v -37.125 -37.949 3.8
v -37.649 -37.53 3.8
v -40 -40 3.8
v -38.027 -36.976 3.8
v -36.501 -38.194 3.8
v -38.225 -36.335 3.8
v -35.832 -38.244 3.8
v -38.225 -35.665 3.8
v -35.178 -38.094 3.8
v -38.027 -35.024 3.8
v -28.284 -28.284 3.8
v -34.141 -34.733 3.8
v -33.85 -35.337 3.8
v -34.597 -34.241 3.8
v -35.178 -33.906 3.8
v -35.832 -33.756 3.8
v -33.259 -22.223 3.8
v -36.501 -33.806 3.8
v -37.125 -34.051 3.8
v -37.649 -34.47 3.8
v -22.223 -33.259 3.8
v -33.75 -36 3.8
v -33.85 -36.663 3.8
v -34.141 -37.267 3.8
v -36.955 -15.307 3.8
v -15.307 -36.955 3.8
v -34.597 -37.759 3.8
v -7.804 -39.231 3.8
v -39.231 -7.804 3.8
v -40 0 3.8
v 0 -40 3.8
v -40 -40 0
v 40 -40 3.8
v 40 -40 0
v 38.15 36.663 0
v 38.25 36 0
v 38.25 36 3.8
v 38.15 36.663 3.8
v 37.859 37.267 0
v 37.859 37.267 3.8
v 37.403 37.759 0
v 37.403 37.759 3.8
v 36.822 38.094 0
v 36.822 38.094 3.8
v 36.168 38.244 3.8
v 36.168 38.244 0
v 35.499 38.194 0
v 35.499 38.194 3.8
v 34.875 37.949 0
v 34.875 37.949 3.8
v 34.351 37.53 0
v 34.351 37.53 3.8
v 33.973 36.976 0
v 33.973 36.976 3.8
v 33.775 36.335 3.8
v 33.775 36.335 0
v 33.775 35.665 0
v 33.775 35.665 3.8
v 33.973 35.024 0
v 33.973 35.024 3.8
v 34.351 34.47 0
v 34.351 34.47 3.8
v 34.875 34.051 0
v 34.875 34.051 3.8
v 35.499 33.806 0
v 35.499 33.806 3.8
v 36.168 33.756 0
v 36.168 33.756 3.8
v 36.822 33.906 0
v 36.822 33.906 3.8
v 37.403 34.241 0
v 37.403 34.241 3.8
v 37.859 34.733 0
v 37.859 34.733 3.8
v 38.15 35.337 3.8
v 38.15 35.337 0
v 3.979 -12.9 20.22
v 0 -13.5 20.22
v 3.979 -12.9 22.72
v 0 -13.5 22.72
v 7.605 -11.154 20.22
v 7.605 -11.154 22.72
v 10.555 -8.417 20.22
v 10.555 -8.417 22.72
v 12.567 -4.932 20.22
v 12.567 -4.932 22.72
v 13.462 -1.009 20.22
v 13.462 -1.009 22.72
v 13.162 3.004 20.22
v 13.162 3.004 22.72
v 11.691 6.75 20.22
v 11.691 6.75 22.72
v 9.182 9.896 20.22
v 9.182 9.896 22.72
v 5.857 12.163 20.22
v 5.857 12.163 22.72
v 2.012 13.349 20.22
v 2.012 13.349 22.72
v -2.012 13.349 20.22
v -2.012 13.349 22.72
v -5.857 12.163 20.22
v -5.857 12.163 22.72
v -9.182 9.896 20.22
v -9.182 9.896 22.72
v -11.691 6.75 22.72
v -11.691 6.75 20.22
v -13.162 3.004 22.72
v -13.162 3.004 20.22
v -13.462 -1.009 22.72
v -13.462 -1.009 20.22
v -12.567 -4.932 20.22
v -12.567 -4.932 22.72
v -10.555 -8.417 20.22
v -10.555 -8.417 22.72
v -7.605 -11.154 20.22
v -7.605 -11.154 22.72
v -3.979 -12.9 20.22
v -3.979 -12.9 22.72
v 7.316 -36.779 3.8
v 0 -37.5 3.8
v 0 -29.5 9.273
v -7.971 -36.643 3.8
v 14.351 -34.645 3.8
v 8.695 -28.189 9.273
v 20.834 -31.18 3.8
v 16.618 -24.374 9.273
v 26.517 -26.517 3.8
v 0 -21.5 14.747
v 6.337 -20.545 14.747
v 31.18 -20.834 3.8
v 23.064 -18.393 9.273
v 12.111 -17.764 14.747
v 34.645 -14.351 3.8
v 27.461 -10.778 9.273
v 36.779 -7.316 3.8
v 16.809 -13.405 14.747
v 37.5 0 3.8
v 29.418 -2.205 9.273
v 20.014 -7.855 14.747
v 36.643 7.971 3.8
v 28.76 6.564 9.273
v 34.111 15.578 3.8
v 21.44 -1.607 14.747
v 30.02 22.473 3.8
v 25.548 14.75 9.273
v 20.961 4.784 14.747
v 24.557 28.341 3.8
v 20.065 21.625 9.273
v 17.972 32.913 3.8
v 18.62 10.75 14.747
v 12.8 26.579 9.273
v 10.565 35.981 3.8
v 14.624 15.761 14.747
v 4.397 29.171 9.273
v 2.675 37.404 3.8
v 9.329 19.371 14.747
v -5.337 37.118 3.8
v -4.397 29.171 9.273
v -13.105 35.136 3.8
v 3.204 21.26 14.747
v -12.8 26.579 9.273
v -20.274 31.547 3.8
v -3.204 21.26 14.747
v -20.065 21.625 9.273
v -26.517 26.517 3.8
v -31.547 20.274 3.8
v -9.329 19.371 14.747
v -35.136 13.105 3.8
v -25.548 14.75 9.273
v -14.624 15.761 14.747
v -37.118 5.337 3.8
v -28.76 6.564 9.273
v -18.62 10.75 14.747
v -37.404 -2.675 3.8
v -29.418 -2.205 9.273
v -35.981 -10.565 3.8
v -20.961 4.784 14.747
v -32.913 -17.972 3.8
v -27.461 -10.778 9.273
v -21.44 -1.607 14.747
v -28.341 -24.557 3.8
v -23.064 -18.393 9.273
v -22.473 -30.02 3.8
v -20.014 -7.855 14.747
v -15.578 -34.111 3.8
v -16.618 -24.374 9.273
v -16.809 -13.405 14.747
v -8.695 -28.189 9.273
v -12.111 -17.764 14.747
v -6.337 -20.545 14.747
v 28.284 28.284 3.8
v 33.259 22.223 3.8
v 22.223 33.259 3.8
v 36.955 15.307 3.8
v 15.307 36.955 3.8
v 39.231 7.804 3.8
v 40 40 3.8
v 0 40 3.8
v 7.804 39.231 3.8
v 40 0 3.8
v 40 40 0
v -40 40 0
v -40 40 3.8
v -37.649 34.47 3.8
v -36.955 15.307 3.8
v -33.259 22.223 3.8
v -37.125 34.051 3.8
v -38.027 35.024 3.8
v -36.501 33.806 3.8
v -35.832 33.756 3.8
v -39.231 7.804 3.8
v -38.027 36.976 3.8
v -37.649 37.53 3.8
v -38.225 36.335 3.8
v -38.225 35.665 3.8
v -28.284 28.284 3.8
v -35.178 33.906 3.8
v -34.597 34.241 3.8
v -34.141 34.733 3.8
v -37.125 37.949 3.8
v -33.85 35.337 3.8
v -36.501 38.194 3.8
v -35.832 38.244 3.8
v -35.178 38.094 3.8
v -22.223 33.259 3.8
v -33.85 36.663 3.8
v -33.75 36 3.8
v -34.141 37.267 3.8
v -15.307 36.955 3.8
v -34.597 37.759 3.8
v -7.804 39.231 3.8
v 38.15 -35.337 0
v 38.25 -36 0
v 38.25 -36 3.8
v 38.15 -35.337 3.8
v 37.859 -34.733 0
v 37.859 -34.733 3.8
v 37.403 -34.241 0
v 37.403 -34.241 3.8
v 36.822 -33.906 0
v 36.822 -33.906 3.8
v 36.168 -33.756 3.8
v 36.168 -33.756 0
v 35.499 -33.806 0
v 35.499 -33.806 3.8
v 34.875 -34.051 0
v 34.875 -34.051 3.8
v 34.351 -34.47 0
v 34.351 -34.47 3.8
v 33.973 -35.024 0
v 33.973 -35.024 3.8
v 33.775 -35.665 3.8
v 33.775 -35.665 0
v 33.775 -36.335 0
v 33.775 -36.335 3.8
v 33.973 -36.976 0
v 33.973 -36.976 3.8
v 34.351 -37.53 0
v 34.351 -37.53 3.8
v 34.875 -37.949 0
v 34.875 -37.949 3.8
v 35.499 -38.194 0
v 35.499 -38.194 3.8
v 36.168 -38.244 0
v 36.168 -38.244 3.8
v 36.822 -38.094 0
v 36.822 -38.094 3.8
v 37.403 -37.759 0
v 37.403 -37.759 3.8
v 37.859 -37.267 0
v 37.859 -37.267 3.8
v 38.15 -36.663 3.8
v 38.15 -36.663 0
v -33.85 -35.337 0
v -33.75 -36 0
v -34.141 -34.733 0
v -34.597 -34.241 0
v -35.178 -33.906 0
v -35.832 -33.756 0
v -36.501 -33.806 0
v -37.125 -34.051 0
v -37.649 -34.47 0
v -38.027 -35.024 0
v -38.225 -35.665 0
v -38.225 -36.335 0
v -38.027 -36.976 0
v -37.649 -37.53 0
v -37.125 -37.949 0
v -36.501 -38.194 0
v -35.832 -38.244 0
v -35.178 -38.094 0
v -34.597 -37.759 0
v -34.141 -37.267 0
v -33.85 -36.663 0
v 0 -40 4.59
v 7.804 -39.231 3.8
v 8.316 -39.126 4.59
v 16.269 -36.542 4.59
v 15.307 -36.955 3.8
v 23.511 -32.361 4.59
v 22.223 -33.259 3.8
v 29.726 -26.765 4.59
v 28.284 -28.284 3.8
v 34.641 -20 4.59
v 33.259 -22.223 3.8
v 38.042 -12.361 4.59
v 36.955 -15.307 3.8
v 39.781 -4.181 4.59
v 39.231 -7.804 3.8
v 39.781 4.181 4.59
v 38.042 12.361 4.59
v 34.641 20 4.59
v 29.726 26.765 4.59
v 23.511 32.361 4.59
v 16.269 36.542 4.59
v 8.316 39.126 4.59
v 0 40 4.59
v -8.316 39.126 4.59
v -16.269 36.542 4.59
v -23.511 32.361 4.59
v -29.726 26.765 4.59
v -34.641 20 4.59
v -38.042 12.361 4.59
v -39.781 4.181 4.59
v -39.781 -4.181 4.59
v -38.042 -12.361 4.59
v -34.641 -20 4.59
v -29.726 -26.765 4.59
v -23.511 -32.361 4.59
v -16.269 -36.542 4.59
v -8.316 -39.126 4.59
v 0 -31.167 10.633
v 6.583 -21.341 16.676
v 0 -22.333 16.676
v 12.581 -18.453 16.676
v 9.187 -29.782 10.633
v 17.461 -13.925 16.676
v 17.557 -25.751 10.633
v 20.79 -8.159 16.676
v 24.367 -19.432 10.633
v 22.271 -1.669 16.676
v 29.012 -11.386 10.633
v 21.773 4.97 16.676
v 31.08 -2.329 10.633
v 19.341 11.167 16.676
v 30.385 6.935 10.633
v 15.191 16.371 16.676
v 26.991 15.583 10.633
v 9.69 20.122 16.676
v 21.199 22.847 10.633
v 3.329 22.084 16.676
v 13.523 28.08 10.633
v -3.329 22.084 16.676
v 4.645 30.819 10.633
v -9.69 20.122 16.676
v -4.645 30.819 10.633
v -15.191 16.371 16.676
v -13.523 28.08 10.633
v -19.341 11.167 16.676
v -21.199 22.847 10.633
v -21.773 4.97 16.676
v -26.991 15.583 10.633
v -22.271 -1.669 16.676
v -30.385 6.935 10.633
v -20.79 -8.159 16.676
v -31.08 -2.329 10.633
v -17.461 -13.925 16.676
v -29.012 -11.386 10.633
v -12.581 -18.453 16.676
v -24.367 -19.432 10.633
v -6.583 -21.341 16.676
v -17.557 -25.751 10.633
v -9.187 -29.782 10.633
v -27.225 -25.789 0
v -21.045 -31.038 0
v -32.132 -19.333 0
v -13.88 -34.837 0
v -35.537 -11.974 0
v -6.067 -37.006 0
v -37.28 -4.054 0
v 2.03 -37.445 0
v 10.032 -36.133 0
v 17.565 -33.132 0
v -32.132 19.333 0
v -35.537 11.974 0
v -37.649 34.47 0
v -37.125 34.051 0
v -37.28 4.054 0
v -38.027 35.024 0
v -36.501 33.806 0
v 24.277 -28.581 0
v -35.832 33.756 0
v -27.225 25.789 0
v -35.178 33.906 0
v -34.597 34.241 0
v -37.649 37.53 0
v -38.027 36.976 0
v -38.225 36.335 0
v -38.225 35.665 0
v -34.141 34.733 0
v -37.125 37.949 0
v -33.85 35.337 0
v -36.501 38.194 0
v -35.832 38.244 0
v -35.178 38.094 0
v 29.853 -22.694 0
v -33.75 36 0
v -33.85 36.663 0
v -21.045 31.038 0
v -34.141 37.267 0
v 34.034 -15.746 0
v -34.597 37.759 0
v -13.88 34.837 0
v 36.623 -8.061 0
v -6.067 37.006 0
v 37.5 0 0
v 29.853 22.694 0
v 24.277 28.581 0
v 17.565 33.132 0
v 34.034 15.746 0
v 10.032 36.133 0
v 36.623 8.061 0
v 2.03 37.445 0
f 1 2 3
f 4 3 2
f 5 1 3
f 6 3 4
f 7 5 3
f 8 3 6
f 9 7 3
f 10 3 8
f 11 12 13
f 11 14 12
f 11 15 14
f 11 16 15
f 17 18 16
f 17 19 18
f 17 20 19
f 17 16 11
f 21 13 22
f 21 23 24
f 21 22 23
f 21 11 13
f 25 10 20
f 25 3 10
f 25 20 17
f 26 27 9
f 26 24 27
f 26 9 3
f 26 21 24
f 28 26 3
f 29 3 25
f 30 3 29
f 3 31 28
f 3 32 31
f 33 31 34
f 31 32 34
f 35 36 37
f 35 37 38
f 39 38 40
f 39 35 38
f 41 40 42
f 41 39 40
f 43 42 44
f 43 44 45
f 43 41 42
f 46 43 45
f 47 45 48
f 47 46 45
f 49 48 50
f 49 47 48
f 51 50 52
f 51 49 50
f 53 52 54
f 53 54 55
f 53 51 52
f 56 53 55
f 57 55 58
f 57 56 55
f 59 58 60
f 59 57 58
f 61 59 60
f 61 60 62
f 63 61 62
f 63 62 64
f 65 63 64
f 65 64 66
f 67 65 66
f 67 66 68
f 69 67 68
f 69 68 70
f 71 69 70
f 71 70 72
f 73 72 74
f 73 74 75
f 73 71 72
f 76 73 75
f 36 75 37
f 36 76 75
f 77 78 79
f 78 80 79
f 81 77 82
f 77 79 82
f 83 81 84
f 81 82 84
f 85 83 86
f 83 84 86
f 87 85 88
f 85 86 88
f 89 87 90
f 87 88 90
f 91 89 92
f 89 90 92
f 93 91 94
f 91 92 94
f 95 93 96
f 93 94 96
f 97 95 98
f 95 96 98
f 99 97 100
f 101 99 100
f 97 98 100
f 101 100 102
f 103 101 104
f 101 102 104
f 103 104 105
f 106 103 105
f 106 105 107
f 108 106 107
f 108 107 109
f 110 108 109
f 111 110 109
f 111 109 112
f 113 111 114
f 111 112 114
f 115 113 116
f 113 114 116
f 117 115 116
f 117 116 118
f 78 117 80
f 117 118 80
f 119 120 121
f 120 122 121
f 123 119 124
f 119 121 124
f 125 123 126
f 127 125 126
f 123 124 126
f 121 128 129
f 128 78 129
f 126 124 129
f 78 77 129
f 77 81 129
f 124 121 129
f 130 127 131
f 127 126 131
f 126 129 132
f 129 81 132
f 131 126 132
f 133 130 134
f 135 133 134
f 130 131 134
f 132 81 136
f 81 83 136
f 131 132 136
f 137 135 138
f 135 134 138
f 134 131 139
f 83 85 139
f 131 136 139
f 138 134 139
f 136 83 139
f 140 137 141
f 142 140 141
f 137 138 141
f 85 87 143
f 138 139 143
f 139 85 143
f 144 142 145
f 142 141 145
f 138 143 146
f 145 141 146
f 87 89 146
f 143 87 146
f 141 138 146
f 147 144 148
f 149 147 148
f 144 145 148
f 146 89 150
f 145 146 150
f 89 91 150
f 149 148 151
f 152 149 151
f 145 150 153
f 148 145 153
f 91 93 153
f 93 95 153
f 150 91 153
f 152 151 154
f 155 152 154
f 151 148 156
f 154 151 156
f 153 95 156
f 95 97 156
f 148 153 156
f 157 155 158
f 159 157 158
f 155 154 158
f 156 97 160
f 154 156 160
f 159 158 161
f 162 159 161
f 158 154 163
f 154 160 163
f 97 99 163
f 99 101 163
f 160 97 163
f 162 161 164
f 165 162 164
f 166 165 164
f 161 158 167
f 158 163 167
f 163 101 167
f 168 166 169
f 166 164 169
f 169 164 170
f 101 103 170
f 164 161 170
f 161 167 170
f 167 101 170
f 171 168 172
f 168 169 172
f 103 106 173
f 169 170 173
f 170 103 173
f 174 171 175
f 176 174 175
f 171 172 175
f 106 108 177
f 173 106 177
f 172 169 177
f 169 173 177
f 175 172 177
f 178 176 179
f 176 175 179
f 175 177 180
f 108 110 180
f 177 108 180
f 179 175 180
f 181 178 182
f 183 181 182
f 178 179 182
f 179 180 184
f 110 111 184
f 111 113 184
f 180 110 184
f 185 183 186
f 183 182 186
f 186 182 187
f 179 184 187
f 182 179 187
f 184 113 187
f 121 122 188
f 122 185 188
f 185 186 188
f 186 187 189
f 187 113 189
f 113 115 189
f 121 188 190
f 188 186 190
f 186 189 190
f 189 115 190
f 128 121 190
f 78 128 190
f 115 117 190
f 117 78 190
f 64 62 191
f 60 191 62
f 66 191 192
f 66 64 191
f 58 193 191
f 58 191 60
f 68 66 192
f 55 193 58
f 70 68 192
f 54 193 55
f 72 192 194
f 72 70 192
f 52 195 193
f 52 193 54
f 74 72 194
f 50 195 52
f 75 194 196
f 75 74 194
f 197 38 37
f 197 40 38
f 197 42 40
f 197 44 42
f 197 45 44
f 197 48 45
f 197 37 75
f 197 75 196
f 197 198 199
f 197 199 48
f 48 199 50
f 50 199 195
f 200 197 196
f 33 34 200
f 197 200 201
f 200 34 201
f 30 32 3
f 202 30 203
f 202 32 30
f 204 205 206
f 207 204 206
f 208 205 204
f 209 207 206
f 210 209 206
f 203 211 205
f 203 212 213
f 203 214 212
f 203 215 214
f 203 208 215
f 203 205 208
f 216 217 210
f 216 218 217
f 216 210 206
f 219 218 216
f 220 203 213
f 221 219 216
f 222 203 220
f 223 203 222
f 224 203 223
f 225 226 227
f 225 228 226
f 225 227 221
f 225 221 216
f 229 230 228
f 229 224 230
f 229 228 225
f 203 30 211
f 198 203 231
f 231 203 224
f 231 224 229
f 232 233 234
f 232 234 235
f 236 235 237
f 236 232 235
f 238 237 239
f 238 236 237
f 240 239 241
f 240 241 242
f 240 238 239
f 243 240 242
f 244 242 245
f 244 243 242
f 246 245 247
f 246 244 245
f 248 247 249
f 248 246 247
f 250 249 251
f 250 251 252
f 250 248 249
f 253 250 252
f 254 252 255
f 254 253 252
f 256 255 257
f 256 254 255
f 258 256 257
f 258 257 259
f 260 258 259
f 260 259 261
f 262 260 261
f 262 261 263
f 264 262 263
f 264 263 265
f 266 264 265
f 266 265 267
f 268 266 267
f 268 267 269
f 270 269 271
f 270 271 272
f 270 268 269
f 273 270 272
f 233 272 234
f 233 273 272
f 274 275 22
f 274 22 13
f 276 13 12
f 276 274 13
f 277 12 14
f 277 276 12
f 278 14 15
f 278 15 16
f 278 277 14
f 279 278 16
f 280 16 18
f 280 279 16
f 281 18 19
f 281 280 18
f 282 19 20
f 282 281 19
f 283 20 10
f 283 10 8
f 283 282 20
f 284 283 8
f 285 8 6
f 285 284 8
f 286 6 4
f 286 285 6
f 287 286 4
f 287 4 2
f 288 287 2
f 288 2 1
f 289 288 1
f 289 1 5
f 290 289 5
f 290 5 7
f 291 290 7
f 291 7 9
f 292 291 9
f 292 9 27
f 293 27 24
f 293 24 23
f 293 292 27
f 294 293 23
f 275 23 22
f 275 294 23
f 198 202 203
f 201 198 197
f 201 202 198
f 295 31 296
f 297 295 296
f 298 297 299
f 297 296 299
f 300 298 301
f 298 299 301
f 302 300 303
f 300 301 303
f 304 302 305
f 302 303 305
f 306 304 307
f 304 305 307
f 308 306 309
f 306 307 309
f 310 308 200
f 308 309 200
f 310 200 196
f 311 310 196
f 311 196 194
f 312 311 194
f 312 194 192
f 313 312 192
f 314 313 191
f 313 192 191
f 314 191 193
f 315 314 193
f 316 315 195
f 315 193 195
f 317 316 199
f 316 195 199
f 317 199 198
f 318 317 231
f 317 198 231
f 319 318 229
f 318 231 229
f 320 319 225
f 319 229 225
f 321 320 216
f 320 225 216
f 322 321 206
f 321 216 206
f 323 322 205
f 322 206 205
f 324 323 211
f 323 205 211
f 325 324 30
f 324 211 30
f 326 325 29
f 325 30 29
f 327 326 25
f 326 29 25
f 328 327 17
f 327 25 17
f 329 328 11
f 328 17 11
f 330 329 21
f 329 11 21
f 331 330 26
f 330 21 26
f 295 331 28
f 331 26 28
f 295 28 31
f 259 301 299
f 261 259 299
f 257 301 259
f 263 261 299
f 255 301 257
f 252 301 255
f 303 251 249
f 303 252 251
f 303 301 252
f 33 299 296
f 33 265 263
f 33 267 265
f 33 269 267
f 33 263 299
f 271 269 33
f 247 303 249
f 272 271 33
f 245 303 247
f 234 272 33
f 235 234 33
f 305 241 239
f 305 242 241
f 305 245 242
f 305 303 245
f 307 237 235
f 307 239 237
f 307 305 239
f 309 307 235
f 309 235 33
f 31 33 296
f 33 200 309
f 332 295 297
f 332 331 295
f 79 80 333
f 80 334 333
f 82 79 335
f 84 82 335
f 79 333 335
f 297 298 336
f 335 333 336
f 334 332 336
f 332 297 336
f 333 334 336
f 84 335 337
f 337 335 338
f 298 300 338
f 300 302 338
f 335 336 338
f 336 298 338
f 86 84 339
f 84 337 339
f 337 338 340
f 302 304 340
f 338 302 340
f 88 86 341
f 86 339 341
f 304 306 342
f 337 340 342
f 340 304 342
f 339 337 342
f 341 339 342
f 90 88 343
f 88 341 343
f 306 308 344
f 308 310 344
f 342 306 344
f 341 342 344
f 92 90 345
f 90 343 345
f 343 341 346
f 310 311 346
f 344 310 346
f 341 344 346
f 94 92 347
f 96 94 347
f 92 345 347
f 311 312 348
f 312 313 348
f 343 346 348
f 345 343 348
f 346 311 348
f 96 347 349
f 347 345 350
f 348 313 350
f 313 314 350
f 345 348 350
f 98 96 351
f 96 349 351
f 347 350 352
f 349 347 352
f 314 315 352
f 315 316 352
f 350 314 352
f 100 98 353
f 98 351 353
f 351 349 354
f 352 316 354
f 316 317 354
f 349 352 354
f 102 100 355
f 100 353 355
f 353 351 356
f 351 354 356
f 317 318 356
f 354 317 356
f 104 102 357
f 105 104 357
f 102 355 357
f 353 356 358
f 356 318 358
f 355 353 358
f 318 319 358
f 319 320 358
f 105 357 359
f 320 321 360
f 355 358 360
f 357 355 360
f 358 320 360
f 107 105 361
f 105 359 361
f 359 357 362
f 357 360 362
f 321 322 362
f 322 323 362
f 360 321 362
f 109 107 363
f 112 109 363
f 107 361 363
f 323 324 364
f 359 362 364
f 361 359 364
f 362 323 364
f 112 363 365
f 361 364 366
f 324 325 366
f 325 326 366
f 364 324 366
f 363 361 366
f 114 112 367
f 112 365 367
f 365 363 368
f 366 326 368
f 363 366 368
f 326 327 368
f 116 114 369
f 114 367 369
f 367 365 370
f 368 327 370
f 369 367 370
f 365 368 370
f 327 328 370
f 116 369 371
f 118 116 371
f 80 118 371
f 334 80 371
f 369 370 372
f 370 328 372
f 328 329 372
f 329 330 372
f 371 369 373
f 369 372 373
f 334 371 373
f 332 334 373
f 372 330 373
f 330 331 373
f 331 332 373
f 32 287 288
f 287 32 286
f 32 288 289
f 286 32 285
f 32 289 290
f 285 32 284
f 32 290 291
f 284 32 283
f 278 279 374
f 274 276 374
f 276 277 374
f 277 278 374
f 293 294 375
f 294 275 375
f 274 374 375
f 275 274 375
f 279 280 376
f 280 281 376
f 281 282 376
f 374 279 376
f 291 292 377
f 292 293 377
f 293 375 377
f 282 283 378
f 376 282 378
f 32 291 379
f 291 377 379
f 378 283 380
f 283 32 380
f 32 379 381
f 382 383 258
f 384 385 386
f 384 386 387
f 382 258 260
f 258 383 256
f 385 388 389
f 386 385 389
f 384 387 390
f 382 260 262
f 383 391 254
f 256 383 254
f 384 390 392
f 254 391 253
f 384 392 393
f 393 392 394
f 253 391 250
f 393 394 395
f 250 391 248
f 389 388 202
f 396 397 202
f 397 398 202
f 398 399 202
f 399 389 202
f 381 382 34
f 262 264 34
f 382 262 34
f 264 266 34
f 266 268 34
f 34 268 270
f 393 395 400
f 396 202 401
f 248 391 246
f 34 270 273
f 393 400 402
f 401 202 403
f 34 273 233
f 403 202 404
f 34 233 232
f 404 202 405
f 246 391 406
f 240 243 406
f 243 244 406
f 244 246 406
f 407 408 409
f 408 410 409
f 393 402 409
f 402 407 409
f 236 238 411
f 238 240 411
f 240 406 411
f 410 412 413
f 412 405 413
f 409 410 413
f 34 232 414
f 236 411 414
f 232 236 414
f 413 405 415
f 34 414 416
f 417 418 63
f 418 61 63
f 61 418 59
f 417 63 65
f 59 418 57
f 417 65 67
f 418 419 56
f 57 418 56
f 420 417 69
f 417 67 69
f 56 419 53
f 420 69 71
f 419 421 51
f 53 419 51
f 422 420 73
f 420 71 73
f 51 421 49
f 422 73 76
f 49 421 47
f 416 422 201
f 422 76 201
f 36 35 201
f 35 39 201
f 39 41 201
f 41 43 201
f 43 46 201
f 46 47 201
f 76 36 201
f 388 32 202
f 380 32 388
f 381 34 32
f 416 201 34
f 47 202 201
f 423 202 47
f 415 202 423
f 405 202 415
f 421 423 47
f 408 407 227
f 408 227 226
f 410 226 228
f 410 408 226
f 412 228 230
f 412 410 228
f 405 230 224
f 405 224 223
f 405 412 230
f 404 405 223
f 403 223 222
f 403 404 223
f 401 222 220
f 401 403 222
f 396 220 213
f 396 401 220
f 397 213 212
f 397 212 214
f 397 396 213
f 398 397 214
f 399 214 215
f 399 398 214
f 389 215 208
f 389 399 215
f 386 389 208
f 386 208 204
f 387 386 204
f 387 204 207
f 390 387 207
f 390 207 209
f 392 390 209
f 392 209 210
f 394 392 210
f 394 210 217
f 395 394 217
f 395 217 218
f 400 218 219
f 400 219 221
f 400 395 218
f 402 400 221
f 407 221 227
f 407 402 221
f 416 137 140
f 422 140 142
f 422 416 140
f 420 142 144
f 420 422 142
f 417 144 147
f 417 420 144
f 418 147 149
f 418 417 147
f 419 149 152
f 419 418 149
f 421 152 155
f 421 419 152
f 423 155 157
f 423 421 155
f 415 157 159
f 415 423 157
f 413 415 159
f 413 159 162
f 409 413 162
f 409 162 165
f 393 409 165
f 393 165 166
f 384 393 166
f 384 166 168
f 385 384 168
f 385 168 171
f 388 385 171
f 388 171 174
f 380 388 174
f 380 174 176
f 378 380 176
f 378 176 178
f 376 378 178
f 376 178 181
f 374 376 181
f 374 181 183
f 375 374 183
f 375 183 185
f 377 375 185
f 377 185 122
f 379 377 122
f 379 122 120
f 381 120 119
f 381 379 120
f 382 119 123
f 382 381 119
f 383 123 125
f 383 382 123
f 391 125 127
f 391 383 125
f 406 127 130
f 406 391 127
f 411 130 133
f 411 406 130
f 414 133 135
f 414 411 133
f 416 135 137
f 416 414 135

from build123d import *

# Parameters (mm, degrees)
F0_W     = 80
F0_H     = 80
F0_R     = 2.25
F0_R_2   = 37.5
F1_DEPTH = 3.8


# Not quite as in the source:
# - a feature names something its author has since deleted; it is built from what else it names


with BuildPart() as f1:
    # F0 (on Top) → F1 (new body)
    with BuildSketch(Plane.XY):
        Rectangle(F0_W, F0_H)
        with Locations((-36, -36)):
            Circle(F0_R, mode=Mode.SUBTRACT)
        with Locations((36, -36)):
            Circle(F0_R, mode=Mode.SUBTRACT)
        with Locations((-36, 36)):
            Circle(F0_R, mode=Mode.SUBTRACT)
        Circle(F0_R_2, mode=Mode.SUBTRACT)
        with Locations((36, 36)):
            Circle(F0_R, mode=Mode.SUBTRACT)
    extrude(amount=F1_DEPTH)

    # F2 (on Right) → F3 (revolve)
    with BuildSketch(Plane.YZ):
        Polygon((-40, 0), (-37.5, 0), (-37.5, 3.8), (-13.5, 20.2198829502), (-13.5, 22.7198829502), (-40, 4.589595526), (-40, 3.8), align=None)
    revolve(axis=Axis((0, 0, 27.8761722147), (0, 0, 1)))


solid = f1.part
